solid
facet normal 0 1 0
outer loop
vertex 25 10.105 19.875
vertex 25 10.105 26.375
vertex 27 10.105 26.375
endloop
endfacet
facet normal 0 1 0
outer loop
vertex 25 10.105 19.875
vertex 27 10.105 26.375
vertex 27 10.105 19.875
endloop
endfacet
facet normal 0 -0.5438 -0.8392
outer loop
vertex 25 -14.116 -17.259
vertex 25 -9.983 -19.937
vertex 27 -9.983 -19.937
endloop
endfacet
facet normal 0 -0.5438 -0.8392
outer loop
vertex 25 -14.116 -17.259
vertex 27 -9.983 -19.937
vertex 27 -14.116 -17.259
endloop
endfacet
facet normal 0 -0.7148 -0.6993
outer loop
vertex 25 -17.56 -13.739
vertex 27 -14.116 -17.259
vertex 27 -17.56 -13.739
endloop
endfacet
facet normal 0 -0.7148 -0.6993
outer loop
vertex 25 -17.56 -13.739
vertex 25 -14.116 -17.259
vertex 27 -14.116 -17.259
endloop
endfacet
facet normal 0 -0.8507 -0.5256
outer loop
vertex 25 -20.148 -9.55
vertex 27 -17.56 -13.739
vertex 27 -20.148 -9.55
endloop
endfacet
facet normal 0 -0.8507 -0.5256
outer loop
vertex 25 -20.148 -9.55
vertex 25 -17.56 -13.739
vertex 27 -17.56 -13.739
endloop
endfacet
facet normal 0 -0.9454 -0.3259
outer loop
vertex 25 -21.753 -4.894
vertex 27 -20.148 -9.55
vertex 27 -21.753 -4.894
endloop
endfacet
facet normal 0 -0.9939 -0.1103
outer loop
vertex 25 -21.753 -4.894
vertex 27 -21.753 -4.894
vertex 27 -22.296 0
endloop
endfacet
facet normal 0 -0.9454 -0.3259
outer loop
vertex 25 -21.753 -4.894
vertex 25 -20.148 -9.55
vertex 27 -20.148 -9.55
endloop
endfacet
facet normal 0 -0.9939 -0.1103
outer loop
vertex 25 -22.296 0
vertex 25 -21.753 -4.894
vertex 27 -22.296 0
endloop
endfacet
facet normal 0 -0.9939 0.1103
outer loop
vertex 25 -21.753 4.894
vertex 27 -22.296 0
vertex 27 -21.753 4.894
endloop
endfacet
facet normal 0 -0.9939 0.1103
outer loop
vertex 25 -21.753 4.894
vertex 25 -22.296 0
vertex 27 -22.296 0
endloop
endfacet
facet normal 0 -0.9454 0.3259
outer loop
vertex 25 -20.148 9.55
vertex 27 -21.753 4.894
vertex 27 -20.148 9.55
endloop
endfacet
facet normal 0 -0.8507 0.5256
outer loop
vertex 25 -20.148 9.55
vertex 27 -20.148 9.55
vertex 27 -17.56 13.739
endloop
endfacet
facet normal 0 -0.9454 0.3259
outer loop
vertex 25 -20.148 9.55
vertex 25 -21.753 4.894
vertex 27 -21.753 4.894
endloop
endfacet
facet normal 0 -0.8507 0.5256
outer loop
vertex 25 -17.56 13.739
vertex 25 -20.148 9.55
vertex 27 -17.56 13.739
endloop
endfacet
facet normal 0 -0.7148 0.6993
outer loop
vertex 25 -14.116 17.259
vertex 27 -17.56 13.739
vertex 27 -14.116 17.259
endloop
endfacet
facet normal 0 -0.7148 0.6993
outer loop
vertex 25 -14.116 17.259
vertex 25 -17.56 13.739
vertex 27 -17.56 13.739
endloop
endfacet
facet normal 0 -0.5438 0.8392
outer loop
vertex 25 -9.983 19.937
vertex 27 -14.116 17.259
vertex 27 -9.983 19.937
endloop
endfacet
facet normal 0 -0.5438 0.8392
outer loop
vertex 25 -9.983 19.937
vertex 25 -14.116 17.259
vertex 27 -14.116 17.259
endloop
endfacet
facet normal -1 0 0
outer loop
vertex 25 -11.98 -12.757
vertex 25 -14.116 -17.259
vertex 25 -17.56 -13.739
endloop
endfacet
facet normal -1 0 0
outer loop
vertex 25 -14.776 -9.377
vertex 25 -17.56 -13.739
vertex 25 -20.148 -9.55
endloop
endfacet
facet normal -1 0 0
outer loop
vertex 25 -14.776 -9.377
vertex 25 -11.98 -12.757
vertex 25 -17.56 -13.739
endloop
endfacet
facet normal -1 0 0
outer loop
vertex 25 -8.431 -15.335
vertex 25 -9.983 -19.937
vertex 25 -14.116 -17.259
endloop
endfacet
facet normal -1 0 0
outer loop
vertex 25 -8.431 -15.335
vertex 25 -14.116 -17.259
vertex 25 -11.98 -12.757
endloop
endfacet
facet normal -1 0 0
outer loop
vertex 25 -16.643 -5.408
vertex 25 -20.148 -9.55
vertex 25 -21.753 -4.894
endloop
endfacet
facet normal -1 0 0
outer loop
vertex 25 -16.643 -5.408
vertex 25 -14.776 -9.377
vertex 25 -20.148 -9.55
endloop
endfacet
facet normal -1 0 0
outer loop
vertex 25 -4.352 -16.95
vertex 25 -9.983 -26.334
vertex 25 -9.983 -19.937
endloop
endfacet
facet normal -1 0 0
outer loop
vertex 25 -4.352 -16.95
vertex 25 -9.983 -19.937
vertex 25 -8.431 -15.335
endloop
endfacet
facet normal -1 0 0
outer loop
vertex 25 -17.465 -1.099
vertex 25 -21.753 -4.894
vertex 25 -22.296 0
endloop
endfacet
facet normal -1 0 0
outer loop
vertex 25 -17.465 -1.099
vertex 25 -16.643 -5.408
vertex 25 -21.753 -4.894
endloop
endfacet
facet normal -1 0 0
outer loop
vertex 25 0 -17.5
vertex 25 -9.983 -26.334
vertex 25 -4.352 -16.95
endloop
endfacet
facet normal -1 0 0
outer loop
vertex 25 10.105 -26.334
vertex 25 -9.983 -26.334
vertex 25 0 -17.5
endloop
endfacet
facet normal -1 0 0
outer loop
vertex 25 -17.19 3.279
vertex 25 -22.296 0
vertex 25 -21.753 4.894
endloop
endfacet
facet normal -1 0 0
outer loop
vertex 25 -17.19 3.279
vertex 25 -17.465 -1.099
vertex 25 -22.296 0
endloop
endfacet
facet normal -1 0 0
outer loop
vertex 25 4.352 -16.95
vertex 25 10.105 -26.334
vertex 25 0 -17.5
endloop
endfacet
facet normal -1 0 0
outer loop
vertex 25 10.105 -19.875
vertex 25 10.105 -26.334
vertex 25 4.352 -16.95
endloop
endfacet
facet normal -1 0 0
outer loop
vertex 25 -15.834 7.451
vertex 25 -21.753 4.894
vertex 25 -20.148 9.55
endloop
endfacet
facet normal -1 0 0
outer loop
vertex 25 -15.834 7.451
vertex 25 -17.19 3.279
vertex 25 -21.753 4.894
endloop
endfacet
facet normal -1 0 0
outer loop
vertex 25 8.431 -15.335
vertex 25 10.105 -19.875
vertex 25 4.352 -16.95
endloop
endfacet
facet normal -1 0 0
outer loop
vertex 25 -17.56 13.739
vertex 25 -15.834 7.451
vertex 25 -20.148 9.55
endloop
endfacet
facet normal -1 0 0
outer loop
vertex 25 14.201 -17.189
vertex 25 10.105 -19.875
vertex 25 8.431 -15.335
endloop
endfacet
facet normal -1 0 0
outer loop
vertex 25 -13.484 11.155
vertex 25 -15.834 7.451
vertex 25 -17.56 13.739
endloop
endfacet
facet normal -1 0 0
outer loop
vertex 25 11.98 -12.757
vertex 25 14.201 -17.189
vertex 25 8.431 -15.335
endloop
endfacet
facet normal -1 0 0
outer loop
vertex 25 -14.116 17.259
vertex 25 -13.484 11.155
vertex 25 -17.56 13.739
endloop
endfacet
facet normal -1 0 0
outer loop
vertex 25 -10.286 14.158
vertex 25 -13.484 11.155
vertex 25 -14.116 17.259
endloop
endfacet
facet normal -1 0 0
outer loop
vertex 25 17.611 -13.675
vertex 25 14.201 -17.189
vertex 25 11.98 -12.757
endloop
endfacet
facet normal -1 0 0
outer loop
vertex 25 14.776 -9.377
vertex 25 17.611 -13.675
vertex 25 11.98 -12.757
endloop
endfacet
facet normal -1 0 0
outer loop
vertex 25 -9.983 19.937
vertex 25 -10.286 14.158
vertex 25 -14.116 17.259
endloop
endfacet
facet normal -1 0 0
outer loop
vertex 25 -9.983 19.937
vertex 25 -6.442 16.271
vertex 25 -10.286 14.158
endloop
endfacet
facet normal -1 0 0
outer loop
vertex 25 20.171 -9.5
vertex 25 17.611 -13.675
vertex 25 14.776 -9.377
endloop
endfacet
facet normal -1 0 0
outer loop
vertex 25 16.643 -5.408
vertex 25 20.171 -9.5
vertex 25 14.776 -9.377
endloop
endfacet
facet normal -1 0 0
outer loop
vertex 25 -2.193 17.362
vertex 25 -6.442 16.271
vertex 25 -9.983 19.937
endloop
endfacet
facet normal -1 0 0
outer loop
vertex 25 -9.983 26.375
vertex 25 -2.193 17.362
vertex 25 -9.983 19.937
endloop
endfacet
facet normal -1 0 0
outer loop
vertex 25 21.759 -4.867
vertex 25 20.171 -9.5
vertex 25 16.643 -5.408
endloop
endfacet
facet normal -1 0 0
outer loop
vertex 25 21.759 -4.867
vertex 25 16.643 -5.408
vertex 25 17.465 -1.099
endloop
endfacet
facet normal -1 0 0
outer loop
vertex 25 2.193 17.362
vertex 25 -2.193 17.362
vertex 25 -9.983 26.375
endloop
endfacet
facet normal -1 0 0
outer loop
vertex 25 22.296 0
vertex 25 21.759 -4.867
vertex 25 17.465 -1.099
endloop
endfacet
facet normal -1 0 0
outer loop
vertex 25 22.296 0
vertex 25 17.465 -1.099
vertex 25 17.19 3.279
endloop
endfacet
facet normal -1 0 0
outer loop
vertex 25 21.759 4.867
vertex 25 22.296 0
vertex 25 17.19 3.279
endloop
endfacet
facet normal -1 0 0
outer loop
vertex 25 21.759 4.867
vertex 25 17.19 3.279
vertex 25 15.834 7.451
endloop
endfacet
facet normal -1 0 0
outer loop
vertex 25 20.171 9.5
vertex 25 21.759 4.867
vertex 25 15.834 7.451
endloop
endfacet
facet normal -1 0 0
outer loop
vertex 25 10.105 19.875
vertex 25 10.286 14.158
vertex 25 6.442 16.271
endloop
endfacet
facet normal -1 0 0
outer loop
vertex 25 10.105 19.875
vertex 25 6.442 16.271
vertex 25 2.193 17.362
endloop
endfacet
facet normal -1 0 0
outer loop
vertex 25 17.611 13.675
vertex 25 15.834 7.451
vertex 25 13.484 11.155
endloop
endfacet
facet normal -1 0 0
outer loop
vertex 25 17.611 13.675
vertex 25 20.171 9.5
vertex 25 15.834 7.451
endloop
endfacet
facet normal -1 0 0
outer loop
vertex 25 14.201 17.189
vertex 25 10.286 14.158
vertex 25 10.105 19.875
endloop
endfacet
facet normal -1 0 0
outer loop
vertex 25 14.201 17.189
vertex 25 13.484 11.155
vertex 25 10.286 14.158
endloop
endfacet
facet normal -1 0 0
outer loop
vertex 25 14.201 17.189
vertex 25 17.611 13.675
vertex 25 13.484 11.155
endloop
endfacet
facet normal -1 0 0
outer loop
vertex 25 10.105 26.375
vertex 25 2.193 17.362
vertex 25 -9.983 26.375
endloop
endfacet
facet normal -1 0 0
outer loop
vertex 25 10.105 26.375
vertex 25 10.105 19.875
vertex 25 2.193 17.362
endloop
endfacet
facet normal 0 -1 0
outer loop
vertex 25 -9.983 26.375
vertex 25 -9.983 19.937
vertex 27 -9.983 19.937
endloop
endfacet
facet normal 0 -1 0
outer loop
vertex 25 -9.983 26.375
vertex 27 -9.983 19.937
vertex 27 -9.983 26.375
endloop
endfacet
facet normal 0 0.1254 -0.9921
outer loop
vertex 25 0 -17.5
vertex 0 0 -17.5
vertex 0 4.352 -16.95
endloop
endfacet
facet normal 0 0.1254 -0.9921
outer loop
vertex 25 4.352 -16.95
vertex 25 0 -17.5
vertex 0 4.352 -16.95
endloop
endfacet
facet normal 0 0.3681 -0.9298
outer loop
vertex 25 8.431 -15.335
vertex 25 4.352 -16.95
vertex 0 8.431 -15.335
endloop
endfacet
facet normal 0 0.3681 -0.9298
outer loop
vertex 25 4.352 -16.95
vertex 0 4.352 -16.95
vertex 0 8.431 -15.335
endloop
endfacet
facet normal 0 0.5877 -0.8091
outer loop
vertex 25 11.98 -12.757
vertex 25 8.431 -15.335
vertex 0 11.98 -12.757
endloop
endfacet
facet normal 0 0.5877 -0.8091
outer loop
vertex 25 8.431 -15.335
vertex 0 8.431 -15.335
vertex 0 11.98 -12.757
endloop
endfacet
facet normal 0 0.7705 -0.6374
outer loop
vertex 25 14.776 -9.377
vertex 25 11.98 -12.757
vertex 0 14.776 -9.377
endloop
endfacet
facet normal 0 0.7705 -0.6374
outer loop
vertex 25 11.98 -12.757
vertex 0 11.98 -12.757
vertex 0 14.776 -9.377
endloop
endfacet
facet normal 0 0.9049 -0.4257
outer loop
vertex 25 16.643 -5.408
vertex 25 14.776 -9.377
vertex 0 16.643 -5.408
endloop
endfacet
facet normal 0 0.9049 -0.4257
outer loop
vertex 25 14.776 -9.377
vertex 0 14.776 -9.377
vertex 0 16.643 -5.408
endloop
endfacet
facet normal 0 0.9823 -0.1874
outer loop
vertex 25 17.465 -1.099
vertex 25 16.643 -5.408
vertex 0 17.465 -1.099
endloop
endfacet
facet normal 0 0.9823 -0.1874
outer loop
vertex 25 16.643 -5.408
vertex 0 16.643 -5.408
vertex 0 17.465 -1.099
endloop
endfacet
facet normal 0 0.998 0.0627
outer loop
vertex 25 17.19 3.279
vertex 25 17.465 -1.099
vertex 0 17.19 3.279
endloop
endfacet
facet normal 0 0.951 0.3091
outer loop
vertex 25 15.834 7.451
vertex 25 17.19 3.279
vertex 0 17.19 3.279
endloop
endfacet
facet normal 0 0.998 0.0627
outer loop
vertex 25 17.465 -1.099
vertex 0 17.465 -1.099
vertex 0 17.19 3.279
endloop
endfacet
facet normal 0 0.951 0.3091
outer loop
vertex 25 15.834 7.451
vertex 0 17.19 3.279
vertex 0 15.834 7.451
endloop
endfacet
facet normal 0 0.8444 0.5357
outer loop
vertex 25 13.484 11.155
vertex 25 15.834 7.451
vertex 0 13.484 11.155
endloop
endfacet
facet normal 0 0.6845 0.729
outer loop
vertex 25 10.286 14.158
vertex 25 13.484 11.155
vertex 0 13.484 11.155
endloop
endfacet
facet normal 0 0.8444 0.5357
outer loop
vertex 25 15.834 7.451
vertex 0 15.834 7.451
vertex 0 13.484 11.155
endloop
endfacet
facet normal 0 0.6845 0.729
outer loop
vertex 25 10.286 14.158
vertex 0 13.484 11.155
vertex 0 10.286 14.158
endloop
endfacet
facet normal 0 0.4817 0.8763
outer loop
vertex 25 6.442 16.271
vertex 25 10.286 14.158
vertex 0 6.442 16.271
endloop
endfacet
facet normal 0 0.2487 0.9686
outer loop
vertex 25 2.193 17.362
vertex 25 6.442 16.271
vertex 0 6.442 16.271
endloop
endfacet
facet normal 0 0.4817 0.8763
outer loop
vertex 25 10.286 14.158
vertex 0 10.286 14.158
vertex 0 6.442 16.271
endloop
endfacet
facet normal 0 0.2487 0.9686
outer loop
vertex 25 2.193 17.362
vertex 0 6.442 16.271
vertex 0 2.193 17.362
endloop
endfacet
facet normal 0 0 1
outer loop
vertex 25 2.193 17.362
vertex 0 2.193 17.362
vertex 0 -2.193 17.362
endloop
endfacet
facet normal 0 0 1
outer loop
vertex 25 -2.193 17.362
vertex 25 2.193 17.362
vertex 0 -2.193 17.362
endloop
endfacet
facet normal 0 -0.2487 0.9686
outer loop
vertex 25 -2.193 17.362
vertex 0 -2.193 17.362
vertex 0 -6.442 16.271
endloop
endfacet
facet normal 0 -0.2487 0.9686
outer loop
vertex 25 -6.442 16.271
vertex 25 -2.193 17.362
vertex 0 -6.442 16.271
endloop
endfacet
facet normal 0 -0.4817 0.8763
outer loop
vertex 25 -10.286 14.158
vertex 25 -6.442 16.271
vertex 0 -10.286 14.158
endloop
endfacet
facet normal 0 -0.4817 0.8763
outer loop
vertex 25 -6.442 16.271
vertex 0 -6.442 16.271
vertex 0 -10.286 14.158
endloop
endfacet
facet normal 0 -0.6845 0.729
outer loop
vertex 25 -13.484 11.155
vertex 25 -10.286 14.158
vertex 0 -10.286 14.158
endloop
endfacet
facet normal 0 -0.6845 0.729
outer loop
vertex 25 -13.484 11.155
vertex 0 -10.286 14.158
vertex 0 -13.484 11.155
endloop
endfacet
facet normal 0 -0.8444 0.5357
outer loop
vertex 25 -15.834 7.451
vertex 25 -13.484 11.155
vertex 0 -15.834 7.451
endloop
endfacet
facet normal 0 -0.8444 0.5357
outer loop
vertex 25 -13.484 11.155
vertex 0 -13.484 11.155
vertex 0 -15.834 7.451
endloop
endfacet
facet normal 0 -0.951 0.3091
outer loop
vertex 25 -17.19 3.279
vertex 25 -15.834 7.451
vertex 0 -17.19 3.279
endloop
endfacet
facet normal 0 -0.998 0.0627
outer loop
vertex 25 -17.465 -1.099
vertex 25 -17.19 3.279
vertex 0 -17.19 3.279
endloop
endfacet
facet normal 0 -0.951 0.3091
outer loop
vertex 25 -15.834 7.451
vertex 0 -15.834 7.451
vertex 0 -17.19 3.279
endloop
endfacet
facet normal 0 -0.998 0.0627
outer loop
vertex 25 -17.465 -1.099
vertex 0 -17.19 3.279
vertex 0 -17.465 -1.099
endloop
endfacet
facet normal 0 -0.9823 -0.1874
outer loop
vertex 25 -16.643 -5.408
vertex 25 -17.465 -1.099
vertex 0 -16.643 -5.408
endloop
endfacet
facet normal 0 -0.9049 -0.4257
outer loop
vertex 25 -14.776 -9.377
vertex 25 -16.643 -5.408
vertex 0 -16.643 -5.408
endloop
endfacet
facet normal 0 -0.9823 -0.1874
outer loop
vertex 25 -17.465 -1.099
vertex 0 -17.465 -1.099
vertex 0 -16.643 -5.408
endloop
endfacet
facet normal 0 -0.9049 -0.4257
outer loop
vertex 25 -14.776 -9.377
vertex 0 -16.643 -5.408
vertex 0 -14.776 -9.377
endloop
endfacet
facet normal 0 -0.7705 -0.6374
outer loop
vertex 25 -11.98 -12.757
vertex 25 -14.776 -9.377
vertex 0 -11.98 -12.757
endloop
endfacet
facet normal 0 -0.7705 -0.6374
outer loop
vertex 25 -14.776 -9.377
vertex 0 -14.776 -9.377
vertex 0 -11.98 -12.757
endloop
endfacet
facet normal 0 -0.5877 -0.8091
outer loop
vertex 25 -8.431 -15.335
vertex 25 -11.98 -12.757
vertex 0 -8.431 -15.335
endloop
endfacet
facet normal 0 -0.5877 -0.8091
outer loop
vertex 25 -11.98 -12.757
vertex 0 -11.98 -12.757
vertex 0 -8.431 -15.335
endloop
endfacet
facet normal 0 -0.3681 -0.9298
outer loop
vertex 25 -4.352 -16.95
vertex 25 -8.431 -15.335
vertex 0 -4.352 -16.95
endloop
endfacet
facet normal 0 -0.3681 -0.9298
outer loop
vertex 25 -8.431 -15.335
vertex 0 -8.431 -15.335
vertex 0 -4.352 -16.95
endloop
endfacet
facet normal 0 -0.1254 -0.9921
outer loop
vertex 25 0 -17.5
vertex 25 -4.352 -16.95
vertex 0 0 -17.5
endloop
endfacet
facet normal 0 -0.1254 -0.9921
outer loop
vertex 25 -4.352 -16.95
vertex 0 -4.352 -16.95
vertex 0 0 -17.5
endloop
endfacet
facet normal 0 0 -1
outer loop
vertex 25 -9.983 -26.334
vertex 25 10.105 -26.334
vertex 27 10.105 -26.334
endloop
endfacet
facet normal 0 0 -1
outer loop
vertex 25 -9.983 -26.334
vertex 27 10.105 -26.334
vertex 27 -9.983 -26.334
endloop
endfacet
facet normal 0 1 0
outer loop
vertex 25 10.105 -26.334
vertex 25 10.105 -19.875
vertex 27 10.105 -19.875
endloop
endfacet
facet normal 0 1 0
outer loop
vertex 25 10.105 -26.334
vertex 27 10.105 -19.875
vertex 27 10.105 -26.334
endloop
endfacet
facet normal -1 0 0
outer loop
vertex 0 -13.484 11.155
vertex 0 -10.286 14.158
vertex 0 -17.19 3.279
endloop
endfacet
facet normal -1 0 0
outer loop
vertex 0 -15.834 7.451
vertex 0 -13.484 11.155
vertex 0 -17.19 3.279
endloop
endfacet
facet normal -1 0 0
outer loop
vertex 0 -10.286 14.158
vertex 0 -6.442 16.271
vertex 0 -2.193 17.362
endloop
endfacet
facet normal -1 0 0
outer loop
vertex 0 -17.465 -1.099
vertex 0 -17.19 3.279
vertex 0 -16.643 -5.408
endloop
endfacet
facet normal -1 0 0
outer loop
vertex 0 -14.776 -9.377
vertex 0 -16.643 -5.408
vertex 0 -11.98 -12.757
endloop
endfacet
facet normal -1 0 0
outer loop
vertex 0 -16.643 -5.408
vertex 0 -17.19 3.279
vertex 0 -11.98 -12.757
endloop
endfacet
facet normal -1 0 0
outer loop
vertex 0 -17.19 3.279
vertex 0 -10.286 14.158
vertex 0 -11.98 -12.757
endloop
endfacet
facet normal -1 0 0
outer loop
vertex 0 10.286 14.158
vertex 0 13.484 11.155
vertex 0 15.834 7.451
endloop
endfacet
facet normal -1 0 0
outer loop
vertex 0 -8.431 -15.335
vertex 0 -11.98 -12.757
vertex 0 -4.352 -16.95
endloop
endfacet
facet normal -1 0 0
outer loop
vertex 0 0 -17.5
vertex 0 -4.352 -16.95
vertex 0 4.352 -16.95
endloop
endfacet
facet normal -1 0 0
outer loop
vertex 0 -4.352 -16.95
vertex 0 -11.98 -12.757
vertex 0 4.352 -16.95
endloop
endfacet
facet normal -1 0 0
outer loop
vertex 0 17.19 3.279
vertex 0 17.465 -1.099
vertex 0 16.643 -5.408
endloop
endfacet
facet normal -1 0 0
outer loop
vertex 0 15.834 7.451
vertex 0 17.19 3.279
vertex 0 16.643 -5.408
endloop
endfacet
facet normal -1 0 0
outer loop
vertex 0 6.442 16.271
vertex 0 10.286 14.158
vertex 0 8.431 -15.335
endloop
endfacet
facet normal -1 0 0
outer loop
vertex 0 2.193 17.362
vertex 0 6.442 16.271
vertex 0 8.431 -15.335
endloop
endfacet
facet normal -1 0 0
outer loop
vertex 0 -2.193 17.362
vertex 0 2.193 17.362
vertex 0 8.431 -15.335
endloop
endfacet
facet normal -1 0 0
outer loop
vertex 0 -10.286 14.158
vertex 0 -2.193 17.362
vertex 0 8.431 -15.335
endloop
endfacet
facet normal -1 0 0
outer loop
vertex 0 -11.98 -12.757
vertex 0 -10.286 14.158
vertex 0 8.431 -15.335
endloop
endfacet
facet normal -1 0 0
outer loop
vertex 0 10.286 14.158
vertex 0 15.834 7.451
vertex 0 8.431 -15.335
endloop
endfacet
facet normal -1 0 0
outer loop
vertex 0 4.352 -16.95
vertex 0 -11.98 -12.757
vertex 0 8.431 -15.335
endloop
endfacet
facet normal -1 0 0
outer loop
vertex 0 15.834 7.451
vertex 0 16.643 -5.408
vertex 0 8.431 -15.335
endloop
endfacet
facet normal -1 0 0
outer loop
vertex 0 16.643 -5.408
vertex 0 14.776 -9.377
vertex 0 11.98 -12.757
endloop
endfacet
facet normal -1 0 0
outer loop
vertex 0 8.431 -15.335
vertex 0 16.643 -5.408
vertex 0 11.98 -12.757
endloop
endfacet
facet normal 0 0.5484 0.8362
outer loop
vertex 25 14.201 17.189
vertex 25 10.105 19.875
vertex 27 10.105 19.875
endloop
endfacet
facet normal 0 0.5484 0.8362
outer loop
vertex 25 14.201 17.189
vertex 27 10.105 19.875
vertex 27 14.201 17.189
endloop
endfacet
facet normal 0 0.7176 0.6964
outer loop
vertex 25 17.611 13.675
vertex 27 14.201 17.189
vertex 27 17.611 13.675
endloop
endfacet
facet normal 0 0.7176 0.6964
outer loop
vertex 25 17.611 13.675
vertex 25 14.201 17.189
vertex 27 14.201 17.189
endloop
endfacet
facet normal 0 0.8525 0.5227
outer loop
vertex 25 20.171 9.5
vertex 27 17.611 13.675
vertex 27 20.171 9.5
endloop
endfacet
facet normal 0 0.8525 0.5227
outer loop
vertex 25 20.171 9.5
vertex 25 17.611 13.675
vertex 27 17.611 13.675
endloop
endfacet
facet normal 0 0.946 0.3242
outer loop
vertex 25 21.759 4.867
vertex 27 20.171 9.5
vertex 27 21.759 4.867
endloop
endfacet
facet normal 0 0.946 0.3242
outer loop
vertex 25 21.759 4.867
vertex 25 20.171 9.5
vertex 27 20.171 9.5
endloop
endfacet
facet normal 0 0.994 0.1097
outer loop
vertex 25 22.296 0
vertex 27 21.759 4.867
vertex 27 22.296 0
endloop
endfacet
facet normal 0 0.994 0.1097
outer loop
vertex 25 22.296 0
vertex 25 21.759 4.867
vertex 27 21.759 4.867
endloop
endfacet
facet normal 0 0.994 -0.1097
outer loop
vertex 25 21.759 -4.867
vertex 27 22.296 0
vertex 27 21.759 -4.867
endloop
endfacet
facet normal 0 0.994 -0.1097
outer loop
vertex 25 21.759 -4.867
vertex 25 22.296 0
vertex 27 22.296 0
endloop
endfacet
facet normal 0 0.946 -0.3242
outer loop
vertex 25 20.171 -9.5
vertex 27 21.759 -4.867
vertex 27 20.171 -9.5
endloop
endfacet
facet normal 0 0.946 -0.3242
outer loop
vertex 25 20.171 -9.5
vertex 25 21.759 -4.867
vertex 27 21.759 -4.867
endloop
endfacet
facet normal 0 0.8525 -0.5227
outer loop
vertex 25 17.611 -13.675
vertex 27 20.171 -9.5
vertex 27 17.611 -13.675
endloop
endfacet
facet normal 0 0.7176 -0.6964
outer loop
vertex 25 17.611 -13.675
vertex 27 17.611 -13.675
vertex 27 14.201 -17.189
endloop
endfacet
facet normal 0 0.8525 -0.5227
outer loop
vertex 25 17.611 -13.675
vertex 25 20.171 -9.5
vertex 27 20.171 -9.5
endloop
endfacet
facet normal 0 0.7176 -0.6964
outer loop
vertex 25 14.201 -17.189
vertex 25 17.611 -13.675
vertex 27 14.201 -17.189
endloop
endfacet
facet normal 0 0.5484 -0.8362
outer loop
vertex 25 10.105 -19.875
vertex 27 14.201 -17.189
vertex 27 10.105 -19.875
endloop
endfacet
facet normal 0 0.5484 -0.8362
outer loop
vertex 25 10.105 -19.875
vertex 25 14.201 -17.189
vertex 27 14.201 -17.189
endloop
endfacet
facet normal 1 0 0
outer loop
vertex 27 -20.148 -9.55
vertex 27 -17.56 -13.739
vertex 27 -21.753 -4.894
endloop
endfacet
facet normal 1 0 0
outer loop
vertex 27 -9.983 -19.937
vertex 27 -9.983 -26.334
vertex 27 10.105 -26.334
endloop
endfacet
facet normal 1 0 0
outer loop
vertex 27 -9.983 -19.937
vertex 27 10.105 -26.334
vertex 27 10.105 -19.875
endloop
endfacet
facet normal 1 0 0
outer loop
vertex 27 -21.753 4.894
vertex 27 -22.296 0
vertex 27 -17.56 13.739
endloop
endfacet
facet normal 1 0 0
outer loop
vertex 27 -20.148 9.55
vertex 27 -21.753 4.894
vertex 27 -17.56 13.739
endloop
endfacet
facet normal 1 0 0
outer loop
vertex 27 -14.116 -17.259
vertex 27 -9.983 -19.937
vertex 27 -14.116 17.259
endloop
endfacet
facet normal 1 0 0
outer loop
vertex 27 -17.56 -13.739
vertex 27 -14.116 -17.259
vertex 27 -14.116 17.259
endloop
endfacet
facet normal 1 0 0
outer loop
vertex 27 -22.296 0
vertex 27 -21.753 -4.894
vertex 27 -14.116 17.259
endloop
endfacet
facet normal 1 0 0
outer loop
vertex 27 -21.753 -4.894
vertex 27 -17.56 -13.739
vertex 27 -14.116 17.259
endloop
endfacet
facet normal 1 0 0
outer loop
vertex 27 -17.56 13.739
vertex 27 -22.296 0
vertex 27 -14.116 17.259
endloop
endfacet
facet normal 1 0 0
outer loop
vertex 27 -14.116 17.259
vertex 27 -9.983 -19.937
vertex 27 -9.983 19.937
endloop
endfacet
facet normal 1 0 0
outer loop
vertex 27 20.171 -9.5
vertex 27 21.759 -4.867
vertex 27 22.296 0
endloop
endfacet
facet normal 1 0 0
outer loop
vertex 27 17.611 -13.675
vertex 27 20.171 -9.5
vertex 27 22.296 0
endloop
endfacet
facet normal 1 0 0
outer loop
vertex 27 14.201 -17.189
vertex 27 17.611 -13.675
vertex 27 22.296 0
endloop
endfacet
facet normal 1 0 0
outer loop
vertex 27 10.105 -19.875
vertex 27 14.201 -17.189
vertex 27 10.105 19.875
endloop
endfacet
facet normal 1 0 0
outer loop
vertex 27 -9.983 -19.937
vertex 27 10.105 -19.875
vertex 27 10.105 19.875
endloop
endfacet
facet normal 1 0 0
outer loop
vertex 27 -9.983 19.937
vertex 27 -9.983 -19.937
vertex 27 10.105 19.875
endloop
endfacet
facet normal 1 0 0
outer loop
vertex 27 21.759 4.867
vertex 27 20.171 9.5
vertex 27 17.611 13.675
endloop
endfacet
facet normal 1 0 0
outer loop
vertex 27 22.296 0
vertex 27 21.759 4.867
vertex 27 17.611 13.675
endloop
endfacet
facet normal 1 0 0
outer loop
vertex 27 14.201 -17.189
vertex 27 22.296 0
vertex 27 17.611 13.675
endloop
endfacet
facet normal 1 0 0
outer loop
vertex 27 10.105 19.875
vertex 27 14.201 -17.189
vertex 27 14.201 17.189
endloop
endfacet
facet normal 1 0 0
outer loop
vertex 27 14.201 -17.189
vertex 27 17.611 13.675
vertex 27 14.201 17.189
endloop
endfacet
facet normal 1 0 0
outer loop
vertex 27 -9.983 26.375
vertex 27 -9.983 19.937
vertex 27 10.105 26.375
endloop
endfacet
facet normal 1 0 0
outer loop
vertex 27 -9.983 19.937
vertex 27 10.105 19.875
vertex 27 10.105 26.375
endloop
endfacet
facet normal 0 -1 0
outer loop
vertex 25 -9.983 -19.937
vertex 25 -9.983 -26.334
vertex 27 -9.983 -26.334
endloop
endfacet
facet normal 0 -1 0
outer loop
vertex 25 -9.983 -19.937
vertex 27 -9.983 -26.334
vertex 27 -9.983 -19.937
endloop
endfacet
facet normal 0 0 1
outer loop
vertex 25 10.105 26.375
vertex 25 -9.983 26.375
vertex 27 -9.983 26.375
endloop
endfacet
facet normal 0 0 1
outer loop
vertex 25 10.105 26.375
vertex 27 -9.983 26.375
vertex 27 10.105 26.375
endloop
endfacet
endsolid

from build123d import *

# Parameters (mm, degrees)
SKETCH_2_R      = 17.5
EXTRUDE_1_DEPTH = 25
EXTRUDE_2_DEPTH = 2


with BuildPart() as part:
    # 草图2 → 凸台-拉伸1 (new body)
    with BuildSketch(Plane(origin=(0, 0, 0), x_dir=(0, 0, -1), z_dir=(1, 0, 0))):
        Circle(SKETCH_2_R)
    extrude(amount=EXTRUDE_1_DEPTH)

    # 草图3 → 凸台-拉伸2 (add)
    with BuildSketch(Plane(origin=(25, 0, 0), x_dir=(0, 0, -1), z_dir=(1, 0, 0))):
        with BuildLine():
            Line((-22.296317142, 10.105406997), (-19.874770628, 10.105406997))
            ThreePointArc((-19.874770628, 10.105406997), (0, 22.296317142), (19.874770628, 10.105406997))
            Line((19.874770628, 10.105406997), (22.296317142, 10.105406997))
            Line((22.296317142, 10.105406997), (26.334302173, 10.105406997))
            Line((26.334302173, 10.105406997), (26.334302173, 0))
            Line((26.334302173, 0), (26.334302173, -9.98295184))
            Line((26.334302173, -9.98295184), (22.296317142, -9.98295184))
            Line((22.296317142, -9.98295184), (19.936560151, -9.98295184))
            ThreePointArc((19.936560151, -9.98295184), (0, -22.296317142), (-19.936560151, -9.98295184))
            Line((-19.936560151, -9.98295184), (-22.296317142, -9.98295184))
            Line((-22.296317142, -9.98295184), (-26.374870703, -9.98295184))
            Line((-26.374870703, -9.98295184), (-26.374870703, 0))
            Line((-26.374870703, 0), (-26.374870703, 10.105406997))
            Line((-26.374870703, 10.105406997), (-22.296317142, 10.105406997))
        make_face()
    extrude(amount=EXTRUDE_2_DEPTH)


solid = part.part
